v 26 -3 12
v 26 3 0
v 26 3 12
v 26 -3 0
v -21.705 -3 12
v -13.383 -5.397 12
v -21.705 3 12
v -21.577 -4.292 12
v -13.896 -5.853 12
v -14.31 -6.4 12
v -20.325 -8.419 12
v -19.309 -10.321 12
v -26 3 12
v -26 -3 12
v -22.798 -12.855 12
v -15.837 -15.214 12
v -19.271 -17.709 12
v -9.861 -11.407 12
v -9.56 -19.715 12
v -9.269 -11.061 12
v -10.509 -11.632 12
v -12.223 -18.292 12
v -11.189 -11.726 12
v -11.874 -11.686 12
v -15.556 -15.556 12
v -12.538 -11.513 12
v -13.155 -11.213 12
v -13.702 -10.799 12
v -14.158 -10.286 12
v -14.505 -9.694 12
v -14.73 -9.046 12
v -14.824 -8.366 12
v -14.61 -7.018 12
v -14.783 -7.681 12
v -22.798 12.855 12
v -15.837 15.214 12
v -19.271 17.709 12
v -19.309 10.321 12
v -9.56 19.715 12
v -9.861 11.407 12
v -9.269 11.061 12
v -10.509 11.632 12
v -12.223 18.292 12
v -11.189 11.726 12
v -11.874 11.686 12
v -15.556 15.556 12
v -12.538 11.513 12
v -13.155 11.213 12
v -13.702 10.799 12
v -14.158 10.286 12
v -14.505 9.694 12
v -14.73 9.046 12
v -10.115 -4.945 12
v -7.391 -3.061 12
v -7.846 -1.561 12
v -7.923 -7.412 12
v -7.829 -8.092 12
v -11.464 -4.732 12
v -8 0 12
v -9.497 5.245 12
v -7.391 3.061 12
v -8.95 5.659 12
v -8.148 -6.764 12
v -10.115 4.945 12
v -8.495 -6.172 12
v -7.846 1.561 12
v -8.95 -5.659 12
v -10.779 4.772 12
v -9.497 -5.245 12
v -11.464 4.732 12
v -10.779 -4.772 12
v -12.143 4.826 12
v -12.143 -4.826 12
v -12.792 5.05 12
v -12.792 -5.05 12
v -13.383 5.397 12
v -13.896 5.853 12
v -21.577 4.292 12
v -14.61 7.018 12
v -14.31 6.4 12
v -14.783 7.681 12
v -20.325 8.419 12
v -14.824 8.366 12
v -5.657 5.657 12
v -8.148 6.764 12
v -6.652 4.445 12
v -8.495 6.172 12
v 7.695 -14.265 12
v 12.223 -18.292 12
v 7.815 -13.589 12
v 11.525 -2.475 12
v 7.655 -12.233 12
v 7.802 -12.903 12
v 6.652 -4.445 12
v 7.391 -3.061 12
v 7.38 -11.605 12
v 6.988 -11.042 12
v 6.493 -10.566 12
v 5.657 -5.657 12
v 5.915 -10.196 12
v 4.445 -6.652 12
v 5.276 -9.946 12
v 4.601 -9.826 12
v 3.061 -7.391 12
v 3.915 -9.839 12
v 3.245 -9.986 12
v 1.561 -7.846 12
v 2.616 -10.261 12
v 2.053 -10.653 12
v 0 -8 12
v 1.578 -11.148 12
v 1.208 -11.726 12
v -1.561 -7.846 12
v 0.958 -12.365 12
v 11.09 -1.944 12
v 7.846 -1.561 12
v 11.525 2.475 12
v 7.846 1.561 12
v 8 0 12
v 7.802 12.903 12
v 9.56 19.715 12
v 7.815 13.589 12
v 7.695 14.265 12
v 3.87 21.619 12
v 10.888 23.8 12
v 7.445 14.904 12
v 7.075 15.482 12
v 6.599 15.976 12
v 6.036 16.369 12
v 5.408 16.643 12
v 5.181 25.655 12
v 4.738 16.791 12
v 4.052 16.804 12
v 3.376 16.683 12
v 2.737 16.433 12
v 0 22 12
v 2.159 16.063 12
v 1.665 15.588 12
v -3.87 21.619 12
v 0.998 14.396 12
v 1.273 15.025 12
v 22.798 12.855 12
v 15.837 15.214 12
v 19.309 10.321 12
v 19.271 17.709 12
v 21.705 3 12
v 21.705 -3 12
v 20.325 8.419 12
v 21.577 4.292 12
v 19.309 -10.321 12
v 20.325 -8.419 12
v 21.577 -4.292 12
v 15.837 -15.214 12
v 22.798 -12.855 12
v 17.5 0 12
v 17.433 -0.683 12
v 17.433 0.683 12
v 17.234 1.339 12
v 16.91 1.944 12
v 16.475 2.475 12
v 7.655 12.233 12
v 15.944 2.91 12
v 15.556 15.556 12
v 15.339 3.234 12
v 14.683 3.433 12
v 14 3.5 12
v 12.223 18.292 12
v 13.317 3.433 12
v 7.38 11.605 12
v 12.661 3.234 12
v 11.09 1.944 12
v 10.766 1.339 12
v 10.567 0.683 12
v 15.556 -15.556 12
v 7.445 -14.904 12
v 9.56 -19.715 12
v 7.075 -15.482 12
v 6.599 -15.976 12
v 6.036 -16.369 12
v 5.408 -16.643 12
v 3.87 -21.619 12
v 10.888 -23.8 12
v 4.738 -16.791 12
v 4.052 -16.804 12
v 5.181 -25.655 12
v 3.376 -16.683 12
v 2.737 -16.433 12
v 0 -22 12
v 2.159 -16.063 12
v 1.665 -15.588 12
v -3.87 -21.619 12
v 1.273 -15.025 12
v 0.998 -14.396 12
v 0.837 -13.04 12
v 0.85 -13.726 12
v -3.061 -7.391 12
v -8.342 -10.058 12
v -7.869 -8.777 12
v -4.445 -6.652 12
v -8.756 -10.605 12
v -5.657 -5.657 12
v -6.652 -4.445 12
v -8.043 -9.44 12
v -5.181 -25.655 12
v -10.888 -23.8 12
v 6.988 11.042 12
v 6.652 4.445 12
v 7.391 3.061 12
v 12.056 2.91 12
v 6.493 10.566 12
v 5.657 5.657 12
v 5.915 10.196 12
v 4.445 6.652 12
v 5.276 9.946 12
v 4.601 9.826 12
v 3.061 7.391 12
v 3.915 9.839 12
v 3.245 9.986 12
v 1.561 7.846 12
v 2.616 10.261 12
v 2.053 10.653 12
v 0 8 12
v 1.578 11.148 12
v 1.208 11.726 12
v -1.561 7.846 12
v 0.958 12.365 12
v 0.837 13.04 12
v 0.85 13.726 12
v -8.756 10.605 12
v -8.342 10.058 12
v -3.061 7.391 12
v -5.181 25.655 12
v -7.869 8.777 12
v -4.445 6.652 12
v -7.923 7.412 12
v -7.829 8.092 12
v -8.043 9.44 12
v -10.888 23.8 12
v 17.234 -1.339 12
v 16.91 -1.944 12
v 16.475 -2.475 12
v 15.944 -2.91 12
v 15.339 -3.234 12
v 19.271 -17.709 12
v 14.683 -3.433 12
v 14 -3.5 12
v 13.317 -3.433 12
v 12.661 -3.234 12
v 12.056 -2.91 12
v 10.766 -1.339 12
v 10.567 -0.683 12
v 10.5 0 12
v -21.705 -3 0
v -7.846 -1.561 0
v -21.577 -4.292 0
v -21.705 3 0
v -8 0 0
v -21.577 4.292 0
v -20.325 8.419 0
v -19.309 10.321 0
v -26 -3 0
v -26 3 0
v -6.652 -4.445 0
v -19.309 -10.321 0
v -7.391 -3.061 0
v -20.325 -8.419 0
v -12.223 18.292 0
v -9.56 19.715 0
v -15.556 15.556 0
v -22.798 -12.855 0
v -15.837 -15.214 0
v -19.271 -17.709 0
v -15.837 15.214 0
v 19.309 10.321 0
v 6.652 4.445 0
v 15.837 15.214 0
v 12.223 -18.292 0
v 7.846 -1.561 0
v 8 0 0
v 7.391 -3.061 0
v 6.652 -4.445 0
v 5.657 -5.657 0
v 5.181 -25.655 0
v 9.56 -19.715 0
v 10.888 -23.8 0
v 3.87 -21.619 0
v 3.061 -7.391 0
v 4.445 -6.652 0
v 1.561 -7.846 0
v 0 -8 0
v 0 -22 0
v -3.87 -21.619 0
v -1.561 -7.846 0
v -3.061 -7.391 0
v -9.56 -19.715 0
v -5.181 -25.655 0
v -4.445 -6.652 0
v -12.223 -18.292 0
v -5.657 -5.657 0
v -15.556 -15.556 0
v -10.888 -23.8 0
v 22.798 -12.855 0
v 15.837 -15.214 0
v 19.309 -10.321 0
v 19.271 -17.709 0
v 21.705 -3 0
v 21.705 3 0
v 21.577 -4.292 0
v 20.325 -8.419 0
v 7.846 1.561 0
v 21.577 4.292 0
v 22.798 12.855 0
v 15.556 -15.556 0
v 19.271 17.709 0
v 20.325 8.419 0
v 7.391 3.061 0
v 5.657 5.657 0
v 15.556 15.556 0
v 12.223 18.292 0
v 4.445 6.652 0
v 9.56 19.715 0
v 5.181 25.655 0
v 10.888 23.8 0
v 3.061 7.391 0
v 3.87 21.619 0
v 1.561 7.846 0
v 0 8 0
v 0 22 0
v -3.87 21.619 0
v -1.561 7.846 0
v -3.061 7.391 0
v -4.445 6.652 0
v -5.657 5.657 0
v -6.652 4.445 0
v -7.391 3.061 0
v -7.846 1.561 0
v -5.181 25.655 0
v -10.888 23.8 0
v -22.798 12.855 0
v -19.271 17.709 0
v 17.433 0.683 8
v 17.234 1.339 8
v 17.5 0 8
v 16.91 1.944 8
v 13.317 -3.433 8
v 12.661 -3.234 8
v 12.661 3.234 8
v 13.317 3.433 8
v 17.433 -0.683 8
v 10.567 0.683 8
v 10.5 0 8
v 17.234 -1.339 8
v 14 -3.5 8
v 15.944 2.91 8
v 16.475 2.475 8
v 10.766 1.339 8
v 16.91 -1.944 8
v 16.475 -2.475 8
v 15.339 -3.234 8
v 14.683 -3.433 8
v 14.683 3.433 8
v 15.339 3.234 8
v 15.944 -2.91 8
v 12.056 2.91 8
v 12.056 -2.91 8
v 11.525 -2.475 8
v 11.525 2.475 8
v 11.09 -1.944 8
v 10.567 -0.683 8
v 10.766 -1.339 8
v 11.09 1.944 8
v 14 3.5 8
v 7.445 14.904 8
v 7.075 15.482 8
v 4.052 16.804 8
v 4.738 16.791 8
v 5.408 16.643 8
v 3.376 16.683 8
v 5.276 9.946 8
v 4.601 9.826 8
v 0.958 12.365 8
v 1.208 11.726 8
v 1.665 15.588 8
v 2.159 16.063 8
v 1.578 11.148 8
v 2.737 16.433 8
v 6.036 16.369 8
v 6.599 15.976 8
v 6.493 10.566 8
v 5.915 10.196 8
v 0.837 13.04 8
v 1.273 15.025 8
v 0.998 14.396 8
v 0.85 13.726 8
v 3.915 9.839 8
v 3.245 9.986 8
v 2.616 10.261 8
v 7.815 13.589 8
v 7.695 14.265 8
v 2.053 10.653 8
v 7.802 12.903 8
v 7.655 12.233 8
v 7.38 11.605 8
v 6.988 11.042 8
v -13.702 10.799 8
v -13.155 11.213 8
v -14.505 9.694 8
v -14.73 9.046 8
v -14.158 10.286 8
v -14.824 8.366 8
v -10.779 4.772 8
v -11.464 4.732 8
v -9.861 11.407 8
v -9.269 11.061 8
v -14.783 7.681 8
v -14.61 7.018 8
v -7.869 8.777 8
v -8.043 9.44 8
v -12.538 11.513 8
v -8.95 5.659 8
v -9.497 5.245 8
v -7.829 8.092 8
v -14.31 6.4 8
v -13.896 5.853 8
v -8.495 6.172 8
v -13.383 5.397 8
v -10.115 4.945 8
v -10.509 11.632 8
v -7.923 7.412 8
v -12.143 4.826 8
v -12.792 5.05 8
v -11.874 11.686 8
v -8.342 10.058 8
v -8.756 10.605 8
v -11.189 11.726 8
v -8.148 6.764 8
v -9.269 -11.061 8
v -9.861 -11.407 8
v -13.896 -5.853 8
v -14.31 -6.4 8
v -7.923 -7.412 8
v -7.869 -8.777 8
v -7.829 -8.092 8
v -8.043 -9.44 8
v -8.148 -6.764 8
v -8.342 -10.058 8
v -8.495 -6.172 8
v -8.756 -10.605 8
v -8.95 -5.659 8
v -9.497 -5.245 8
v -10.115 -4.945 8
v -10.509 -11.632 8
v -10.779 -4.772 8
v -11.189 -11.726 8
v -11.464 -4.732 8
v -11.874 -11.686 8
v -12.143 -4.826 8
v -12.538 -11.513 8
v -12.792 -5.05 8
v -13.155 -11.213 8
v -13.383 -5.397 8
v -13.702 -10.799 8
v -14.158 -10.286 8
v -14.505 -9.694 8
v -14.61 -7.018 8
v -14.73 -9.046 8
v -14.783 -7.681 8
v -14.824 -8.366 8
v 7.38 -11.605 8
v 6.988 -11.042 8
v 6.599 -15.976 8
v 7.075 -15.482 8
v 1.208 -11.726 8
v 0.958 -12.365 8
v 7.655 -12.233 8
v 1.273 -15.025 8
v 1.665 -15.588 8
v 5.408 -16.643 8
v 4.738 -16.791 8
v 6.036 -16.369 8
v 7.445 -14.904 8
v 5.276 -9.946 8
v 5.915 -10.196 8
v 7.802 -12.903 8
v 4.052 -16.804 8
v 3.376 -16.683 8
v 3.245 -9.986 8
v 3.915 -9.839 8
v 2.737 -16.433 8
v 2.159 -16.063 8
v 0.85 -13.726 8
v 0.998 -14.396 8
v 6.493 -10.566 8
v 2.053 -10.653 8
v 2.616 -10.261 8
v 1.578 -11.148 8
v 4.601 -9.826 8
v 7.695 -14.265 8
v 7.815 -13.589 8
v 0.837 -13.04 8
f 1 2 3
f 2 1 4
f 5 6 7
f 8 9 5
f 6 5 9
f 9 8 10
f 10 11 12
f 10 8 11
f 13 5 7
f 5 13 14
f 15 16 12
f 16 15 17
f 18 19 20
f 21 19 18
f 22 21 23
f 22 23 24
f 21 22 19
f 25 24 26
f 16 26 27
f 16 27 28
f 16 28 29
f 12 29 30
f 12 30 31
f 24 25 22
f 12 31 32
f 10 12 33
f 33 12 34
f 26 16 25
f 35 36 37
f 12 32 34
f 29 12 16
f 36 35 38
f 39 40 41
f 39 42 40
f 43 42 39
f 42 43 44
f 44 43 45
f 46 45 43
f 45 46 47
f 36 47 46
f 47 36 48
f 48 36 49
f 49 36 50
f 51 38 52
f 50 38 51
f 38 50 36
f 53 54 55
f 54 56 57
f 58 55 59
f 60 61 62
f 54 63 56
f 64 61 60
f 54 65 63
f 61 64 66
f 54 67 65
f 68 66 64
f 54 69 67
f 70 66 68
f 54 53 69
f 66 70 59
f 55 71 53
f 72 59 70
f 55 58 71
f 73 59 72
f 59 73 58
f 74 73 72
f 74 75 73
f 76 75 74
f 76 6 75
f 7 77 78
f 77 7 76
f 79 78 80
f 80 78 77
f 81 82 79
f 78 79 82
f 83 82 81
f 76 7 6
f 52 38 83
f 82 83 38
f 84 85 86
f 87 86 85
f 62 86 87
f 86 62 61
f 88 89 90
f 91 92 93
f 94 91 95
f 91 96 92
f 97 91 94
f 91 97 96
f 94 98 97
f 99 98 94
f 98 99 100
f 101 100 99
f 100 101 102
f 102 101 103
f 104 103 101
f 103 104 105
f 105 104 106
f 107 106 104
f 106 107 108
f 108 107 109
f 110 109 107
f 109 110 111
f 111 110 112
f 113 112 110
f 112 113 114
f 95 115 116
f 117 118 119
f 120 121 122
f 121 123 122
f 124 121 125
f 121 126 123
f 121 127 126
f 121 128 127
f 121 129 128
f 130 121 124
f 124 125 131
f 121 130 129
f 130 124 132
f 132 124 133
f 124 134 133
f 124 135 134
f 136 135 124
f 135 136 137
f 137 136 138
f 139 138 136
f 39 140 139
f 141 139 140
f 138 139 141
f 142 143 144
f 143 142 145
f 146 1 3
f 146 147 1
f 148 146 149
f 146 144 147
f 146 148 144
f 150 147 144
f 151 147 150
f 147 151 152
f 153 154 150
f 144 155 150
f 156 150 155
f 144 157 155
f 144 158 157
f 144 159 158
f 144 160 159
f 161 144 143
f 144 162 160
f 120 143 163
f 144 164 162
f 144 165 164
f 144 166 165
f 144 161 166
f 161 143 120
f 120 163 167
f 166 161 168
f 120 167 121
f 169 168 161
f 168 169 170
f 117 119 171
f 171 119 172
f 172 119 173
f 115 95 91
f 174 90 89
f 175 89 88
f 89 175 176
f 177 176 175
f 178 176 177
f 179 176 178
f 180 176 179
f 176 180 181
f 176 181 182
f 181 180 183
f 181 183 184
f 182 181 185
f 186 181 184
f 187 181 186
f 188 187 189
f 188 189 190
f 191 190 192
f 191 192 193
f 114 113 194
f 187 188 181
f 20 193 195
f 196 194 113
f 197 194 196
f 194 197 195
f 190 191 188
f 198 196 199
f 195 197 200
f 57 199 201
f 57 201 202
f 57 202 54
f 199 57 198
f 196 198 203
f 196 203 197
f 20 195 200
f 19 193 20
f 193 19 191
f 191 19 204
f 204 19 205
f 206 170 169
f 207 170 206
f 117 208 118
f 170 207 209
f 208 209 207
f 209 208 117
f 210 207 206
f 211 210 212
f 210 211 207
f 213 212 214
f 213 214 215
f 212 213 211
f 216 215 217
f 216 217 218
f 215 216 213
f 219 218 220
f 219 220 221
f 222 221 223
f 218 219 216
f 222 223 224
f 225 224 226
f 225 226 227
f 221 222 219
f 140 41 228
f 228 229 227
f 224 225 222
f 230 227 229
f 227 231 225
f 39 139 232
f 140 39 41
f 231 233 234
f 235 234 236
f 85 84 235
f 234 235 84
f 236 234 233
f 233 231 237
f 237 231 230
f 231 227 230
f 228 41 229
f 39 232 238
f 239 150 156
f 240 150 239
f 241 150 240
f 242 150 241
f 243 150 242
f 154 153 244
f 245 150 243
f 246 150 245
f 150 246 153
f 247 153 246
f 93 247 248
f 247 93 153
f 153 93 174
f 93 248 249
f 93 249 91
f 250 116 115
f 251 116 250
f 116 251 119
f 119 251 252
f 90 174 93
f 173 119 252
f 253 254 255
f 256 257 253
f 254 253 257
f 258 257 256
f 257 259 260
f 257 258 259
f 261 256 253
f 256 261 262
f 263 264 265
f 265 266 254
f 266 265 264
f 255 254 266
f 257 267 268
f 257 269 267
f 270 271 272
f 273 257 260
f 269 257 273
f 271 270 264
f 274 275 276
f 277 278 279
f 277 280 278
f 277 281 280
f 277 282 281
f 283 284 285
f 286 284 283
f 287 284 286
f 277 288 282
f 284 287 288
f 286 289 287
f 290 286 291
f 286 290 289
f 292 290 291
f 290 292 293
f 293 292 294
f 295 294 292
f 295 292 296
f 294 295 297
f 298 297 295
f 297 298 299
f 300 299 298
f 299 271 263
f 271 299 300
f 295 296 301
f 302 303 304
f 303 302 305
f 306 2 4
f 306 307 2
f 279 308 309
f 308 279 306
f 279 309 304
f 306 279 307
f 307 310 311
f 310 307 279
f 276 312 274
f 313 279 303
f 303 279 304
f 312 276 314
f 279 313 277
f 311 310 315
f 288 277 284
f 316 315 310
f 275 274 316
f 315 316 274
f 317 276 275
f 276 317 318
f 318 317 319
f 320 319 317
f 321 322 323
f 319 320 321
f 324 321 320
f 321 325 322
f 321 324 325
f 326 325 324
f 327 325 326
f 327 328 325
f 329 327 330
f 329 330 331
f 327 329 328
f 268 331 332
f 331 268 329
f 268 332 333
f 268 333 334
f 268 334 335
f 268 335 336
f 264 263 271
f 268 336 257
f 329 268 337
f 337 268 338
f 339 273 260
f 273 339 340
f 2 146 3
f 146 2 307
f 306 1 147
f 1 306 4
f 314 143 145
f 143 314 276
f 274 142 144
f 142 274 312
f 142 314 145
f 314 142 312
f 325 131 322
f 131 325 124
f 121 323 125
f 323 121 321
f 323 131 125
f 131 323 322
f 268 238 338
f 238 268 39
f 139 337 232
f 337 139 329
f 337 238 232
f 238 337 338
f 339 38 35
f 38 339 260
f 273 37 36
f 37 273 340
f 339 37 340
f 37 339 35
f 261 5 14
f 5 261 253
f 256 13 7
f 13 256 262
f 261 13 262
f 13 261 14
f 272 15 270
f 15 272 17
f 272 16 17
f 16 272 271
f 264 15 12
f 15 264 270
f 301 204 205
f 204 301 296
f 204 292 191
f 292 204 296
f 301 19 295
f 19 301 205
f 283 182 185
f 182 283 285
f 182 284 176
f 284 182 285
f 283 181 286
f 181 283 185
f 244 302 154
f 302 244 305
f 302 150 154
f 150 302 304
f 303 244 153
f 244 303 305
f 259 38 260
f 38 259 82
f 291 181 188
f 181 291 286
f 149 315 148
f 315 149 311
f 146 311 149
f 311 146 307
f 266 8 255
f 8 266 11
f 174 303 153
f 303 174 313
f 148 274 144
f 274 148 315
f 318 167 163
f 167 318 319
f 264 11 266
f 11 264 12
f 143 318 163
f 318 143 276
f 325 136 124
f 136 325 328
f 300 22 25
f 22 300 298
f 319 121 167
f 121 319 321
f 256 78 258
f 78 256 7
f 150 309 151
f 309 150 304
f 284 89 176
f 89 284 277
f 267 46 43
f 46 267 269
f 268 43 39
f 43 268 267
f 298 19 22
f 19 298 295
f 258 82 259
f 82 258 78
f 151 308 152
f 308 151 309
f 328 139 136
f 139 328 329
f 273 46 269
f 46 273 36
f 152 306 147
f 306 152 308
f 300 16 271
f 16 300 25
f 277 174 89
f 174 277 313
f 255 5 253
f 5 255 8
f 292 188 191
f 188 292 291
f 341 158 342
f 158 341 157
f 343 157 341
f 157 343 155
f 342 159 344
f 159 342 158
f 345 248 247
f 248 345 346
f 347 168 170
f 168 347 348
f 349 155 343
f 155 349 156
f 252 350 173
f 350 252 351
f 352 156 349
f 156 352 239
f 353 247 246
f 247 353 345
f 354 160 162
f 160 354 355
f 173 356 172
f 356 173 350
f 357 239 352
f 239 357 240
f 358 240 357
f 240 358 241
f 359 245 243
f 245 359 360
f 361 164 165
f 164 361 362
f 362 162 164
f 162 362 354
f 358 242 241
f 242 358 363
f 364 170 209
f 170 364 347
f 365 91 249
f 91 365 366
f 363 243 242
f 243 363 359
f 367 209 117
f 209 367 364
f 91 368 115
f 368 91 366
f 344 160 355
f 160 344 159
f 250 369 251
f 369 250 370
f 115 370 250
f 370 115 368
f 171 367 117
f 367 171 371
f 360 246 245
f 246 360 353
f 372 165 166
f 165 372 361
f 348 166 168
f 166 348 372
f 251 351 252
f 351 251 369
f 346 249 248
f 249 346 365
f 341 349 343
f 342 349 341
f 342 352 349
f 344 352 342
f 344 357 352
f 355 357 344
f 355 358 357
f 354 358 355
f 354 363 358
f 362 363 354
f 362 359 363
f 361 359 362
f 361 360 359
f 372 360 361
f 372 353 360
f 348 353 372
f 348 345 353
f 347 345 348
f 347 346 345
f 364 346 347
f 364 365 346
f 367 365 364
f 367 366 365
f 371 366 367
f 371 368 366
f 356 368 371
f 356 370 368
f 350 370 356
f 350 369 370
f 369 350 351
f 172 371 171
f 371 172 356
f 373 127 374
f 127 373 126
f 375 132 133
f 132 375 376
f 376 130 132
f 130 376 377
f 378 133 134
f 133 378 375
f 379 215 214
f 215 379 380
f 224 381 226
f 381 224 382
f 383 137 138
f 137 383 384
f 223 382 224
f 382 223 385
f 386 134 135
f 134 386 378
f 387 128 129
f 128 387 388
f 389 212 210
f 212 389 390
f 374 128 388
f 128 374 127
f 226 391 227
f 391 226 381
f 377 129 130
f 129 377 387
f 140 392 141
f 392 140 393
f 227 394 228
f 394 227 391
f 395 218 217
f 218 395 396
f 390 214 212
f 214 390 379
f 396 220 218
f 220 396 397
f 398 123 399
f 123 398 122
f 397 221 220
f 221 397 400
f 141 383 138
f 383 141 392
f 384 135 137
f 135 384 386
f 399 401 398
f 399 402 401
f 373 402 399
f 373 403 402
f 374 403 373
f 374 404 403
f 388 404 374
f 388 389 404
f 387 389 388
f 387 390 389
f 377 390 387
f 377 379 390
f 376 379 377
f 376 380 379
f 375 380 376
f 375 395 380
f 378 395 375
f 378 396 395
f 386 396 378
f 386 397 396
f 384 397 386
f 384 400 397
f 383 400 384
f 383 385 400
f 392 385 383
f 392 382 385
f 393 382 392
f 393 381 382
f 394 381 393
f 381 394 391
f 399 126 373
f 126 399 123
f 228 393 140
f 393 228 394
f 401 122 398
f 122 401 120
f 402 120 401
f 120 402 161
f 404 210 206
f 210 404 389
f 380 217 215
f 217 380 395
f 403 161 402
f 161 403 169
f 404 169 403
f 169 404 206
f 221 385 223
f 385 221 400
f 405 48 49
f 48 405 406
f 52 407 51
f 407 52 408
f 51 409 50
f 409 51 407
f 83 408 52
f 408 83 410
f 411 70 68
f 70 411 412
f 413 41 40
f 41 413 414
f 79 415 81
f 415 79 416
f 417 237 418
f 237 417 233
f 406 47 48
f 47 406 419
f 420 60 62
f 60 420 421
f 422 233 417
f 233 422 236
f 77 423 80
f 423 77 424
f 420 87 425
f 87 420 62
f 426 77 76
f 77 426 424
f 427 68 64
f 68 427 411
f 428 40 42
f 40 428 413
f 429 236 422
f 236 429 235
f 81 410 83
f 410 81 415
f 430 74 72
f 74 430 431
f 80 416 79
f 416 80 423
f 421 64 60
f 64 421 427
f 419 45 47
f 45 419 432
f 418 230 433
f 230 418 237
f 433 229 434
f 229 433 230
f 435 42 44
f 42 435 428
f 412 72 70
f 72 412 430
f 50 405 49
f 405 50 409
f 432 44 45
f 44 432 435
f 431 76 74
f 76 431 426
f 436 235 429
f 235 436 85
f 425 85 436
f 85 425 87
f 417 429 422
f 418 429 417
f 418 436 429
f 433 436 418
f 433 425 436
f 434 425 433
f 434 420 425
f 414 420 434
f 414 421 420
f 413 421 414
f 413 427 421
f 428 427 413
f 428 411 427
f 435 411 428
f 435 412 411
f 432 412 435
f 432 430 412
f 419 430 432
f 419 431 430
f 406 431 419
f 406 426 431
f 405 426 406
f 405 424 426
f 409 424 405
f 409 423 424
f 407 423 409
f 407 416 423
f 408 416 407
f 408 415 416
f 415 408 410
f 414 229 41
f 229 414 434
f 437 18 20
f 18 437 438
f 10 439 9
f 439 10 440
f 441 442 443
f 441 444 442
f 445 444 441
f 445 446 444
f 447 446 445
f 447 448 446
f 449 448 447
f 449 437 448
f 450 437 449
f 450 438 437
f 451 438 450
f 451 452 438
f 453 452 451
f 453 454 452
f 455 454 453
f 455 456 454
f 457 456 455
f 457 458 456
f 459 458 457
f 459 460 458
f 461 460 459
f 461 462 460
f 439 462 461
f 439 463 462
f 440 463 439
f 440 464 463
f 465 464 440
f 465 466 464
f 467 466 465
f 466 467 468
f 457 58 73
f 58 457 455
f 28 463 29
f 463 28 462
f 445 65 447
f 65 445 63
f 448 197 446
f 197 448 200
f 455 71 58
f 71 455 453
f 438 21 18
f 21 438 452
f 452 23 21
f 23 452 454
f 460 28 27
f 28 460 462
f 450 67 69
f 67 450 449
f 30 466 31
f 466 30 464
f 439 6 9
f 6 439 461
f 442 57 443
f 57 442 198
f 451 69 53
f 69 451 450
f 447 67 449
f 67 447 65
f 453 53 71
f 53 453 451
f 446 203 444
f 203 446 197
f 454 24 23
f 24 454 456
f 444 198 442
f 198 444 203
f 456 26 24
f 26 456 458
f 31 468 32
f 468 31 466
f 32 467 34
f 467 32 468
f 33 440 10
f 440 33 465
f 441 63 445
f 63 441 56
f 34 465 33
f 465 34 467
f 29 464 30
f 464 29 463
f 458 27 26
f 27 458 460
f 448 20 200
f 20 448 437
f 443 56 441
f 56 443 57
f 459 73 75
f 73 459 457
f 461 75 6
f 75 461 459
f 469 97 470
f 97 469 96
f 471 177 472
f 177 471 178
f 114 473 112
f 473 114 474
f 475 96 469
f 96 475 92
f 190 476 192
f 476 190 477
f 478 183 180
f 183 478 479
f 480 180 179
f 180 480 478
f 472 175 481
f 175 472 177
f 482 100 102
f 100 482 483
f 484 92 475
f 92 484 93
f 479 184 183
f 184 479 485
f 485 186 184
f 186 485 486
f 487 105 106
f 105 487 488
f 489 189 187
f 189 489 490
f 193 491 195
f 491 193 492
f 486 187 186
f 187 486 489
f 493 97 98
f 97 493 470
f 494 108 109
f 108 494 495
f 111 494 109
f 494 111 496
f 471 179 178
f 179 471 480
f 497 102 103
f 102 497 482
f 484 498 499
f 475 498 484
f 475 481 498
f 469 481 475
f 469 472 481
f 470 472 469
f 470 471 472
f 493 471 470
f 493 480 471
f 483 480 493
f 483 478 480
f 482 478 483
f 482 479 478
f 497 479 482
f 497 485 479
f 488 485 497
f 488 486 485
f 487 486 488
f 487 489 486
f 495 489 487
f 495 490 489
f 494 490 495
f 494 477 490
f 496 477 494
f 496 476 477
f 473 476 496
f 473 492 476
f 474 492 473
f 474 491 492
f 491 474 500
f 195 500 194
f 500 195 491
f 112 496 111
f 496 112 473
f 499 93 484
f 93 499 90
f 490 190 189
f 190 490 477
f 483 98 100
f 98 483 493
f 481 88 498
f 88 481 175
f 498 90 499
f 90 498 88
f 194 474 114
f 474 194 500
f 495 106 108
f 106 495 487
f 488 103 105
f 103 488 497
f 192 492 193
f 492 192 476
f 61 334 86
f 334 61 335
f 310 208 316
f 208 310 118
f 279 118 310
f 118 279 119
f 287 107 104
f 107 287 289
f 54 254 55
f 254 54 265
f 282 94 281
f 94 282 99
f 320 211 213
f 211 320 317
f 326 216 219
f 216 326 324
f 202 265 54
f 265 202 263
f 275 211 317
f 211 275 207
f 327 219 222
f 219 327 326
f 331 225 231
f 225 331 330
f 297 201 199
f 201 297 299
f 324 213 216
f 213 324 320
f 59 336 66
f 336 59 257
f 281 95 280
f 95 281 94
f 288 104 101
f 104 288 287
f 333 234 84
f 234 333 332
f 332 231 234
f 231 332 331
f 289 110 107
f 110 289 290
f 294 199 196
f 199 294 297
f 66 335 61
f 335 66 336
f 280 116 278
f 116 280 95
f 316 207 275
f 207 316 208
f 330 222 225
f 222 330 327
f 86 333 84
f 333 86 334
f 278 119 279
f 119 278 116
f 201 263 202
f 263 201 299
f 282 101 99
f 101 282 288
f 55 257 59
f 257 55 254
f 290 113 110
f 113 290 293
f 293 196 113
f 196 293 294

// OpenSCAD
$fn = 32;

// ----------------------------------------------------------------------
// Spur blank: lightened gear blank
// ----------------------------------------------------------------------

// --- parameters (mm) ---
disc_r = 22;              // blank root radius
disc_t = 12;              // blank thickness
n_teeth = 10;             // stub tooth count
tooth_w = 6;              // tooth width at the root
tooth_h = 4;              // tooth height above the root
bore_r = 8;               // central bore radius
ring_r = 14;              // lightening pocket ring radius
pocket_r = 3.5;           // lightening pocket radius
fit_tol = 0.1;            // tolerance for press fits, mm
free_tol = 0.5;           // tolerance for clearance fits, mm

out_r = disc_r + tooth_h;  // tip radius
bbox_x = 52.0;  // measured width over the teeth
bbox_y = 51.31;  // measured depth over the teeth

difference() {
union() {
  cylinder(r = disc_r, h = disc_t);
  for (i = [0 : n_teeth - 1])
    rotate([0, 0, i * 360 / n_teeth])
      translate([disc_r - 1, -tooth_w / 2, 0])
        cube([tooth_h + 1, tooth_w, disc_t]);
}
  translate([0, 0, -1]) cylinder(r = bore_r, h = disc_t + 2);
  for (i = [0 : 5])
    rotate([0, 0, i * 72])
      translate([ring_r, 0, disc_t - 4])
        cylinder(r = pocket_r, h = 5);
}
